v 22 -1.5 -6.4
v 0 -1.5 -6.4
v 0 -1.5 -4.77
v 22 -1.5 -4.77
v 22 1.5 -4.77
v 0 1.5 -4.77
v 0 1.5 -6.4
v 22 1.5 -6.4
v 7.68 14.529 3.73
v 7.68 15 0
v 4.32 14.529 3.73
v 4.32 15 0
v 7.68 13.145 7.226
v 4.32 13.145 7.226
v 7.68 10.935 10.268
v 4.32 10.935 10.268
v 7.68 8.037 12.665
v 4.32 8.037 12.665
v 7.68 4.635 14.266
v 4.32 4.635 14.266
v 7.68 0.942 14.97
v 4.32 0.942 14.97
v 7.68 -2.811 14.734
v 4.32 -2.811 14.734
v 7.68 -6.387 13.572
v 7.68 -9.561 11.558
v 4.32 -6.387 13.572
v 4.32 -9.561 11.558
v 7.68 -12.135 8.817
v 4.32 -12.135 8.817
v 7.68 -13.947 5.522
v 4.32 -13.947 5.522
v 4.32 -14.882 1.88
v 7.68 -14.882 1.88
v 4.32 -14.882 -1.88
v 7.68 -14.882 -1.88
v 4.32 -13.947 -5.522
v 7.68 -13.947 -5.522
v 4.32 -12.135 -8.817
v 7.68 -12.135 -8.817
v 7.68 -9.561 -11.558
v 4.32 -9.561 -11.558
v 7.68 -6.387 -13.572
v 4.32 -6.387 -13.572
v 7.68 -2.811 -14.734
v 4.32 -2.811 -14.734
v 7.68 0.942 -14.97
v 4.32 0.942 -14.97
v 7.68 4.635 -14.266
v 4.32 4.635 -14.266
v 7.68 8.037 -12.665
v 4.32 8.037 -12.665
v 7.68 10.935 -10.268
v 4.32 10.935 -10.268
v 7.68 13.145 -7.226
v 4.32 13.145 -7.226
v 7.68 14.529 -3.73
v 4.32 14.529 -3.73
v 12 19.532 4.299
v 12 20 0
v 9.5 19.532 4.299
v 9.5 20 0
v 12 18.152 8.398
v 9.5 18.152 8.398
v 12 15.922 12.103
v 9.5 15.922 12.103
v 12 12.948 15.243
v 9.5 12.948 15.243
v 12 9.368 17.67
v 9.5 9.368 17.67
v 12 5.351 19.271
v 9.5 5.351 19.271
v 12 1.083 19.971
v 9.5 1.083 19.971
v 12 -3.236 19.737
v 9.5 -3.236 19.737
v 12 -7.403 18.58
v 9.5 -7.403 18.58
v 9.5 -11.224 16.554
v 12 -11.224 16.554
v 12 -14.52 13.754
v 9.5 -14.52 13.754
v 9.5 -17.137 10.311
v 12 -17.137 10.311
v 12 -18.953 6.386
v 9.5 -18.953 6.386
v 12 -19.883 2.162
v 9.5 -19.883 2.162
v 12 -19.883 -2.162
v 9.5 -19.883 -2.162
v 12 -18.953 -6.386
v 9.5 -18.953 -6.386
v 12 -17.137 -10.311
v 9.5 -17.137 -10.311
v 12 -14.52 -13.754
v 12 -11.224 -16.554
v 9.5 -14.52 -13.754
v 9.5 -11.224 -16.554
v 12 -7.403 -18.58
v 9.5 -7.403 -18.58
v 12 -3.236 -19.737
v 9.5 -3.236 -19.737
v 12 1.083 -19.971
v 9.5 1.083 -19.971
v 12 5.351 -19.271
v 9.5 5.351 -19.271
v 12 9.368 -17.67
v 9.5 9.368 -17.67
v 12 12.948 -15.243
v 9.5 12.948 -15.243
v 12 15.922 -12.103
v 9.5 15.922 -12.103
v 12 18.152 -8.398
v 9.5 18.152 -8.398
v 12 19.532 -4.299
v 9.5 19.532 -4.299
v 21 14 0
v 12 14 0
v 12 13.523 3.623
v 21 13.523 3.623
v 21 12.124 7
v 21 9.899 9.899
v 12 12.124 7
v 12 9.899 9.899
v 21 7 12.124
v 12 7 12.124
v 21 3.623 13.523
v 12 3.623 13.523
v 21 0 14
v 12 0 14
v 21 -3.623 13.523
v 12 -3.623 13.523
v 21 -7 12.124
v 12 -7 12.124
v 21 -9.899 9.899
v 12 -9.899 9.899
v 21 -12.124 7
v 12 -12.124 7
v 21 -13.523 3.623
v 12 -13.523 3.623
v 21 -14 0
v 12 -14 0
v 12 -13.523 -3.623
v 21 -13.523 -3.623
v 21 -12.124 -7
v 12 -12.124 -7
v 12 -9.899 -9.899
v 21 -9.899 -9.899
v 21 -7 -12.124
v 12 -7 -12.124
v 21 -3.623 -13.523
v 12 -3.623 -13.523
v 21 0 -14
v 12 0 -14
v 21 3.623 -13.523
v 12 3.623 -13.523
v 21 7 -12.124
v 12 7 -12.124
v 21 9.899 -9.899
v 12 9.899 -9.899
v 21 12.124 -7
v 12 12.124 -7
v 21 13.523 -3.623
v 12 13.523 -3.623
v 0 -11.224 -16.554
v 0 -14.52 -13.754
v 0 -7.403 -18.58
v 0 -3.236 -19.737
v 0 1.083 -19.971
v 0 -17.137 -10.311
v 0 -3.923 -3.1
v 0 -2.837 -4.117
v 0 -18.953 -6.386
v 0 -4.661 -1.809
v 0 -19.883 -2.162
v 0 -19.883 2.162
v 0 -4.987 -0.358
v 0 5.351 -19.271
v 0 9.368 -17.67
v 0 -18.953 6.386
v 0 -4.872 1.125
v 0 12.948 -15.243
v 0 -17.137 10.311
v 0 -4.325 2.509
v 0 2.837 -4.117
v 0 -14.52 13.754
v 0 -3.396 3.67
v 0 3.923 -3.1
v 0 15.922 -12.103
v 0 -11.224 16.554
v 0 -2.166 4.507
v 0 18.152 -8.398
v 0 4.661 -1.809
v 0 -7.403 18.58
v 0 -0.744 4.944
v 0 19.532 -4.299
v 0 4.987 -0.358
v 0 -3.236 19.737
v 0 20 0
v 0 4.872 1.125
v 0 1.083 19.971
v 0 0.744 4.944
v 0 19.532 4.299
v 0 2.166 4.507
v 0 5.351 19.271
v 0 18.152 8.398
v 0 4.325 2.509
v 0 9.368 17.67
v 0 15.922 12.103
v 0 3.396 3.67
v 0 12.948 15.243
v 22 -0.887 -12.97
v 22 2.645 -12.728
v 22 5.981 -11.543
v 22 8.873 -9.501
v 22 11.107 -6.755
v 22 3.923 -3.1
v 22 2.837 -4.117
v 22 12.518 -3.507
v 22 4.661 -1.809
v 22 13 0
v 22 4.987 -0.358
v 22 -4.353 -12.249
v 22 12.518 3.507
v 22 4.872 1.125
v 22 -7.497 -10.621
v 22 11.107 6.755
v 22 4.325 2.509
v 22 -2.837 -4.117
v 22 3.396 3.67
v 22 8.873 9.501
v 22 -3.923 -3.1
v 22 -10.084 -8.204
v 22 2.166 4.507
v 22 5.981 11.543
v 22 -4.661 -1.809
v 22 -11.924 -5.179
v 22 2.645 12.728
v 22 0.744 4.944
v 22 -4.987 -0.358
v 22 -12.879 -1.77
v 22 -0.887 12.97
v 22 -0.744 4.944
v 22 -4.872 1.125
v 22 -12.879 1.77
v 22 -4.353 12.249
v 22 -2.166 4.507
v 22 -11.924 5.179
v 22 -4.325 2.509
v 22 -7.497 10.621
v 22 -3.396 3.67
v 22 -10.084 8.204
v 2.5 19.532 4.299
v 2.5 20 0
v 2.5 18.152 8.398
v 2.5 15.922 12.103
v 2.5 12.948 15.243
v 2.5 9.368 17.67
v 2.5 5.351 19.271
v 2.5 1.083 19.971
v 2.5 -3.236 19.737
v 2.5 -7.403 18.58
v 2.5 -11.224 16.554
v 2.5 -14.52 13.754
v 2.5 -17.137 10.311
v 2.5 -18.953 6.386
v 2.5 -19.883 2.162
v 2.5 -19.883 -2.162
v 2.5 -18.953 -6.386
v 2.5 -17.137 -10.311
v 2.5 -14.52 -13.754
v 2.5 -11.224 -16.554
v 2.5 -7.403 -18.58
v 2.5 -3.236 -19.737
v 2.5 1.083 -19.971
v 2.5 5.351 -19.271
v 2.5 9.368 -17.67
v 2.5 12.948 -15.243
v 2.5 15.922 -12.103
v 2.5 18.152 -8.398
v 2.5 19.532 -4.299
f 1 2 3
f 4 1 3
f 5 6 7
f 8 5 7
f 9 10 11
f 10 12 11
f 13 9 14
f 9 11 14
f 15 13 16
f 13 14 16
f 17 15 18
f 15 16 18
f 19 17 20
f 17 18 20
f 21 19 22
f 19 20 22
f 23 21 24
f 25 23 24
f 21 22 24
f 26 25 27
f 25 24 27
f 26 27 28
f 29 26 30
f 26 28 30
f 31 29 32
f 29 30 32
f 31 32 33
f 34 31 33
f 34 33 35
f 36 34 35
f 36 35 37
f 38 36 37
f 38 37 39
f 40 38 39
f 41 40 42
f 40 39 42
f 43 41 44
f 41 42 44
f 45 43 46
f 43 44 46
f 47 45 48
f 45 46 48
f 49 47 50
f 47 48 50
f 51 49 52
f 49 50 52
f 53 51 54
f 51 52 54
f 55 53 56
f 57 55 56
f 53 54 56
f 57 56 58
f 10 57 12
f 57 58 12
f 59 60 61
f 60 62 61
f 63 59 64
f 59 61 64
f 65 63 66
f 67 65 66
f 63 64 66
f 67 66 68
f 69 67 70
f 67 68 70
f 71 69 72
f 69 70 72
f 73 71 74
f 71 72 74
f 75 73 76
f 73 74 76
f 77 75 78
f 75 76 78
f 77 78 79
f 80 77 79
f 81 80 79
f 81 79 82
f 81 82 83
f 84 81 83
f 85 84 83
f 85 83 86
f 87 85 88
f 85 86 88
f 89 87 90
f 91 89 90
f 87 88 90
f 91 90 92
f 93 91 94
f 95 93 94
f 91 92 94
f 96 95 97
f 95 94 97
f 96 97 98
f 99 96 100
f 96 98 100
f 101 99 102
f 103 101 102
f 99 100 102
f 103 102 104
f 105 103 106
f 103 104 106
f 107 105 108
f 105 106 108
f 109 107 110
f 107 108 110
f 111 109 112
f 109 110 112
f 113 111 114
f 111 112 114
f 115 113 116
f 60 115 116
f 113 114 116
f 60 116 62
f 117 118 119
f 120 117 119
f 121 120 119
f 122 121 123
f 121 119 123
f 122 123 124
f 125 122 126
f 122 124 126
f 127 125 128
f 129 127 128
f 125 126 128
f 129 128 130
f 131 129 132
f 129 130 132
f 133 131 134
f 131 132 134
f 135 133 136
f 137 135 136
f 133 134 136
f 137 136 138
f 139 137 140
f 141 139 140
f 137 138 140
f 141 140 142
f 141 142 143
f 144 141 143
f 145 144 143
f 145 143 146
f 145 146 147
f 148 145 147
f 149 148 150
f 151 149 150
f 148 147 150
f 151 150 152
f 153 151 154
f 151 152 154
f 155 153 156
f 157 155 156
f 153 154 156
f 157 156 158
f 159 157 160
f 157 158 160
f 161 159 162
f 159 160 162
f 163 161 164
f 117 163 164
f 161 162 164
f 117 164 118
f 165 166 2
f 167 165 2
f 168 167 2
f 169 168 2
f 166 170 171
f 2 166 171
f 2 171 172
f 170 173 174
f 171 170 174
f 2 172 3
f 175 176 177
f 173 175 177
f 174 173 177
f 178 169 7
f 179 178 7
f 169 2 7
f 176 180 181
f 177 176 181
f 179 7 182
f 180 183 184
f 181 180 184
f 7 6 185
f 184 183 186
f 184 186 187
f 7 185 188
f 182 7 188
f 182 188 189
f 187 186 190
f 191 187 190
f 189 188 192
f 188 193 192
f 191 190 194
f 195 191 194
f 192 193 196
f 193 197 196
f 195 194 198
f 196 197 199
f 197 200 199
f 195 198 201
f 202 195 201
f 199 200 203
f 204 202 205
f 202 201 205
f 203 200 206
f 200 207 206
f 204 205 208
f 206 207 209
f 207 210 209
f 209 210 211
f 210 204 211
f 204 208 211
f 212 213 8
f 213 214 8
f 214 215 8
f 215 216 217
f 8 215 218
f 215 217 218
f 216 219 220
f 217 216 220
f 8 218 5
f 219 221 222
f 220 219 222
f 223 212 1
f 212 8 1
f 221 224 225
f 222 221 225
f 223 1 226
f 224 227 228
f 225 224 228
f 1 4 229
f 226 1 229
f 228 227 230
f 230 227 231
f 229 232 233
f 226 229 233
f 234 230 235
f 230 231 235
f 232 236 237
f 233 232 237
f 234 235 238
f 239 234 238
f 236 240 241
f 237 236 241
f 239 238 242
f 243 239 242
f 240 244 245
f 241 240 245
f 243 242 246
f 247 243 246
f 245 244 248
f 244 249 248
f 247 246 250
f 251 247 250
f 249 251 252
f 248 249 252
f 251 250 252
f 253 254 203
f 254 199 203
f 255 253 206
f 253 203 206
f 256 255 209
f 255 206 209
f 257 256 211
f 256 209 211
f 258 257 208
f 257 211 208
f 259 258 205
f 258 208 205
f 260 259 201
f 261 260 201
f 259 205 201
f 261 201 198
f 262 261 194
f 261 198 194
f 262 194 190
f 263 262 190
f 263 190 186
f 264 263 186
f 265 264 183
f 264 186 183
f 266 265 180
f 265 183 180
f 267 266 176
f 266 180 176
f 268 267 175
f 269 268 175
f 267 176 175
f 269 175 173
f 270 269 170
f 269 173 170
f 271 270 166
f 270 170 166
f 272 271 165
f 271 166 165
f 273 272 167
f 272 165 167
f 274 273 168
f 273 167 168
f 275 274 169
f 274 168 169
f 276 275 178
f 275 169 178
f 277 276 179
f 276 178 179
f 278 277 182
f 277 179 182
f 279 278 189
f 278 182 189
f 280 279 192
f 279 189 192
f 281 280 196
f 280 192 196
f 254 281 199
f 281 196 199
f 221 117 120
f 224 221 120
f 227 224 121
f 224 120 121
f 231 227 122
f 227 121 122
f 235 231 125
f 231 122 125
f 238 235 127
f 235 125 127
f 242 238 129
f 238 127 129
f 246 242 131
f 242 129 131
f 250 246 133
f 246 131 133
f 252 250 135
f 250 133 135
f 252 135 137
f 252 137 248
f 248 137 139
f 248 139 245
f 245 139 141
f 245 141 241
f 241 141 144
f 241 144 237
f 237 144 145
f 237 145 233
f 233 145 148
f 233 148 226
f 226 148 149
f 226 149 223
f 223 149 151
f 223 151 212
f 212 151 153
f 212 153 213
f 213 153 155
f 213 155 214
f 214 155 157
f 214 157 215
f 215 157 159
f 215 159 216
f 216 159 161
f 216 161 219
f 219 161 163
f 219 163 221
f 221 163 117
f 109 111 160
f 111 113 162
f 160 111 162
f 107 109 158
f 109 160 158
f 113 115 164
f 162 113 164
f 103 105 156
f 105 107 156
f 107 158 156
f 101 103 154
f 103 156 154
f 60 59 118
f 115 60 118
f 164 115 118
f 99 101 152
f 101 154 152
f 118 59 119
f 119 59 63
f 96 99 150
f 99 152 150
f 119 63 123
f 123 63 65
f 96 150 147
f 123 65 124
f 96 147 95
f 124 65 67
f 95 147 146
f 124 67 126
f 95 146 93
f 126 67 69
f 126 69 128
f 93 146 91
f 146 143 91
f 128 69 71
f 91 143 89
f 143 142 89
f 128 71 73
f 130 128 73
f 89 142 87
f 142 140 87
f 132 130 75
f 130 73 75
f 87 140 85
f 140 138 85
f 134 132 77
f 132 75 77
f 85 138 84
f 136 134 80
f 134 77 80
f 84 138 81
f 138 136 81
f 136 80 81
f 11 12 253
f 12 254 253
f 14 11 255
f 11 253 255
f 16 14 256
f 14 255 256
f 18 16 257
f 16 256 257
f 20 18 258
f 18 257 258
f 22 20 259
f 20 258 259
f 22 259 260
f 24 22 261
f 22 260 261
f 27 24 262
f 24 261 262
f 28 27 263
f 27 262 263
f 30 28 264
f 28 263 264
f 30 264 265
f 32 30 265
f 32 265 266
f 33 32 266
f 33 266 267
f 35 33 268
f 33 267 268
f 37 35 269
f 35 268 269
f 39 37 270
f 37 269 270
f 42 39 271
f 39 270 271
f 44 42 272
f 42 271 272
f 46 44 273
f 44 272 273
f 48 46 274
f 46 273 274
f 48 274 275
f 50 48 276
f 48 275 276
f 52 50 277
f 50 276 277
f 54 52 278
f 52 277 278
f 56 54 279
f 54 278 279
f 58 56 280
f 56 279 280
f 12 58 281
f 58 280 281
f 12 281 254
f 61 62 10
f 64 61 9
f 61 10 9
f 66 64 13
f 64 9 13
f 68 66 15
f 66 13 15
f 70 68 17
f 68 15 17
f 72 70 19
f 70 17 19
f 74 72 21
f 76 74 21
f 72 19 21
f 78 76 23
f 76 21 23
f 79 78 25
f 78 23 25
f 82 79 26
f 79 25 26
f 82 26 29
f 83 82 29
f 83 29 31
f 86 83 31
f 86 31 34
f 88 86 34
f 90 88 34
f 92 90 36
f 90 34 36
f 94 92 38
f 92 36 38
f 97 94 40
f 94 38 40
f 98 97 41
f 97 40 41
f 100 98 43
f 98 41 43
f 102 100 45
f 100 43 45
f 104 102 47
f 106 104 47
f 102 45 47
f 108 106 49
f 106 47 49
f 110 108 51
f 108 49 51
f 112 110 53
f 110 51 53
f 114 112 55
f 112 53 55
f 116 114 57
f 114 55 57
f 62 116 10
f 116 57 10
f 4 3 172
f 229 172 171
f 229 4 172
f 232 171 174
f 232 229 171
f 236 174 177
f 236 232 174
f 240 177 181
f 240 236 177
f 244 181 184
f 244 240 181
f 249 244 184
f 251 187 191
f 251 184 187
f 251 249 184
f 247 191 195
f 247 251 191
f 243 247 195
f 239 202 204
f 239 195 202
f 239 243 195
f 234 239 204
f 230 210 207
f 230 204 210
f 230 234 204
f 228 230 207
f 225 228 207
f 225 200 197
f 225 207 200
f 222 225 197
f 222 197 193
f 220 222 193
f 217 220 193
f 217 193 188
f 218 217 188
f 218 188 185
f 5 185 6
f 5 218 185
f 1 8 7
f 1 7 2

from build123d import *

# Parameters (mm, degrees)
CUT_EXTRUDE1_DEPTH = 23
CHAMFER1_SIZE      = 1


with BuildPart() as part:
    # Sketch2 → Revolve1 (revolve)
    with BuildSketch(Plane.XY):
        Polygon((0, 0), (22, 0), (22, 14), (12, 14), (12, 20), (9.5, 20), (7.680148663, 15), (4.319851044, 15), (2.5, 20.000000107), (0, 20.000000107), align=None)
    revolve(axis=Axis((0, 0, 0), (1, 0, 0)))

    # Sketch3 → Cut-Extrude1 (cut, through all)
    with BuildSketch(Plane(origin=(22, 0, 0), x_dir=(0, 0, -1), z_dir=(1, 0, 0))):
        with BuildLine():
            Line((6.4, 1.5), (6.4, -1.5))
            Line((6.4, -1.5), (4.769696007, -1.5))
            ThreePointArc((4.769696007, -1.5), (-5, 0), (4.769696007, 1.5))
            Line((4.769696007, 1.5), (6.4, 1.5))
        make_face()
    extrude(amount=-CUT_EXTRUDE1_DEPTH, mode=Mode.SUBTRACT)

    # Chamfer1
    chamfer1_edges = [part.edges().sort_by_distance(p)[0] for p in [
        (22, -14, 0),
    ]]
    chamfer(chamfer1_edges, length=CHAMFER1_SIZE)


solid = part.part
